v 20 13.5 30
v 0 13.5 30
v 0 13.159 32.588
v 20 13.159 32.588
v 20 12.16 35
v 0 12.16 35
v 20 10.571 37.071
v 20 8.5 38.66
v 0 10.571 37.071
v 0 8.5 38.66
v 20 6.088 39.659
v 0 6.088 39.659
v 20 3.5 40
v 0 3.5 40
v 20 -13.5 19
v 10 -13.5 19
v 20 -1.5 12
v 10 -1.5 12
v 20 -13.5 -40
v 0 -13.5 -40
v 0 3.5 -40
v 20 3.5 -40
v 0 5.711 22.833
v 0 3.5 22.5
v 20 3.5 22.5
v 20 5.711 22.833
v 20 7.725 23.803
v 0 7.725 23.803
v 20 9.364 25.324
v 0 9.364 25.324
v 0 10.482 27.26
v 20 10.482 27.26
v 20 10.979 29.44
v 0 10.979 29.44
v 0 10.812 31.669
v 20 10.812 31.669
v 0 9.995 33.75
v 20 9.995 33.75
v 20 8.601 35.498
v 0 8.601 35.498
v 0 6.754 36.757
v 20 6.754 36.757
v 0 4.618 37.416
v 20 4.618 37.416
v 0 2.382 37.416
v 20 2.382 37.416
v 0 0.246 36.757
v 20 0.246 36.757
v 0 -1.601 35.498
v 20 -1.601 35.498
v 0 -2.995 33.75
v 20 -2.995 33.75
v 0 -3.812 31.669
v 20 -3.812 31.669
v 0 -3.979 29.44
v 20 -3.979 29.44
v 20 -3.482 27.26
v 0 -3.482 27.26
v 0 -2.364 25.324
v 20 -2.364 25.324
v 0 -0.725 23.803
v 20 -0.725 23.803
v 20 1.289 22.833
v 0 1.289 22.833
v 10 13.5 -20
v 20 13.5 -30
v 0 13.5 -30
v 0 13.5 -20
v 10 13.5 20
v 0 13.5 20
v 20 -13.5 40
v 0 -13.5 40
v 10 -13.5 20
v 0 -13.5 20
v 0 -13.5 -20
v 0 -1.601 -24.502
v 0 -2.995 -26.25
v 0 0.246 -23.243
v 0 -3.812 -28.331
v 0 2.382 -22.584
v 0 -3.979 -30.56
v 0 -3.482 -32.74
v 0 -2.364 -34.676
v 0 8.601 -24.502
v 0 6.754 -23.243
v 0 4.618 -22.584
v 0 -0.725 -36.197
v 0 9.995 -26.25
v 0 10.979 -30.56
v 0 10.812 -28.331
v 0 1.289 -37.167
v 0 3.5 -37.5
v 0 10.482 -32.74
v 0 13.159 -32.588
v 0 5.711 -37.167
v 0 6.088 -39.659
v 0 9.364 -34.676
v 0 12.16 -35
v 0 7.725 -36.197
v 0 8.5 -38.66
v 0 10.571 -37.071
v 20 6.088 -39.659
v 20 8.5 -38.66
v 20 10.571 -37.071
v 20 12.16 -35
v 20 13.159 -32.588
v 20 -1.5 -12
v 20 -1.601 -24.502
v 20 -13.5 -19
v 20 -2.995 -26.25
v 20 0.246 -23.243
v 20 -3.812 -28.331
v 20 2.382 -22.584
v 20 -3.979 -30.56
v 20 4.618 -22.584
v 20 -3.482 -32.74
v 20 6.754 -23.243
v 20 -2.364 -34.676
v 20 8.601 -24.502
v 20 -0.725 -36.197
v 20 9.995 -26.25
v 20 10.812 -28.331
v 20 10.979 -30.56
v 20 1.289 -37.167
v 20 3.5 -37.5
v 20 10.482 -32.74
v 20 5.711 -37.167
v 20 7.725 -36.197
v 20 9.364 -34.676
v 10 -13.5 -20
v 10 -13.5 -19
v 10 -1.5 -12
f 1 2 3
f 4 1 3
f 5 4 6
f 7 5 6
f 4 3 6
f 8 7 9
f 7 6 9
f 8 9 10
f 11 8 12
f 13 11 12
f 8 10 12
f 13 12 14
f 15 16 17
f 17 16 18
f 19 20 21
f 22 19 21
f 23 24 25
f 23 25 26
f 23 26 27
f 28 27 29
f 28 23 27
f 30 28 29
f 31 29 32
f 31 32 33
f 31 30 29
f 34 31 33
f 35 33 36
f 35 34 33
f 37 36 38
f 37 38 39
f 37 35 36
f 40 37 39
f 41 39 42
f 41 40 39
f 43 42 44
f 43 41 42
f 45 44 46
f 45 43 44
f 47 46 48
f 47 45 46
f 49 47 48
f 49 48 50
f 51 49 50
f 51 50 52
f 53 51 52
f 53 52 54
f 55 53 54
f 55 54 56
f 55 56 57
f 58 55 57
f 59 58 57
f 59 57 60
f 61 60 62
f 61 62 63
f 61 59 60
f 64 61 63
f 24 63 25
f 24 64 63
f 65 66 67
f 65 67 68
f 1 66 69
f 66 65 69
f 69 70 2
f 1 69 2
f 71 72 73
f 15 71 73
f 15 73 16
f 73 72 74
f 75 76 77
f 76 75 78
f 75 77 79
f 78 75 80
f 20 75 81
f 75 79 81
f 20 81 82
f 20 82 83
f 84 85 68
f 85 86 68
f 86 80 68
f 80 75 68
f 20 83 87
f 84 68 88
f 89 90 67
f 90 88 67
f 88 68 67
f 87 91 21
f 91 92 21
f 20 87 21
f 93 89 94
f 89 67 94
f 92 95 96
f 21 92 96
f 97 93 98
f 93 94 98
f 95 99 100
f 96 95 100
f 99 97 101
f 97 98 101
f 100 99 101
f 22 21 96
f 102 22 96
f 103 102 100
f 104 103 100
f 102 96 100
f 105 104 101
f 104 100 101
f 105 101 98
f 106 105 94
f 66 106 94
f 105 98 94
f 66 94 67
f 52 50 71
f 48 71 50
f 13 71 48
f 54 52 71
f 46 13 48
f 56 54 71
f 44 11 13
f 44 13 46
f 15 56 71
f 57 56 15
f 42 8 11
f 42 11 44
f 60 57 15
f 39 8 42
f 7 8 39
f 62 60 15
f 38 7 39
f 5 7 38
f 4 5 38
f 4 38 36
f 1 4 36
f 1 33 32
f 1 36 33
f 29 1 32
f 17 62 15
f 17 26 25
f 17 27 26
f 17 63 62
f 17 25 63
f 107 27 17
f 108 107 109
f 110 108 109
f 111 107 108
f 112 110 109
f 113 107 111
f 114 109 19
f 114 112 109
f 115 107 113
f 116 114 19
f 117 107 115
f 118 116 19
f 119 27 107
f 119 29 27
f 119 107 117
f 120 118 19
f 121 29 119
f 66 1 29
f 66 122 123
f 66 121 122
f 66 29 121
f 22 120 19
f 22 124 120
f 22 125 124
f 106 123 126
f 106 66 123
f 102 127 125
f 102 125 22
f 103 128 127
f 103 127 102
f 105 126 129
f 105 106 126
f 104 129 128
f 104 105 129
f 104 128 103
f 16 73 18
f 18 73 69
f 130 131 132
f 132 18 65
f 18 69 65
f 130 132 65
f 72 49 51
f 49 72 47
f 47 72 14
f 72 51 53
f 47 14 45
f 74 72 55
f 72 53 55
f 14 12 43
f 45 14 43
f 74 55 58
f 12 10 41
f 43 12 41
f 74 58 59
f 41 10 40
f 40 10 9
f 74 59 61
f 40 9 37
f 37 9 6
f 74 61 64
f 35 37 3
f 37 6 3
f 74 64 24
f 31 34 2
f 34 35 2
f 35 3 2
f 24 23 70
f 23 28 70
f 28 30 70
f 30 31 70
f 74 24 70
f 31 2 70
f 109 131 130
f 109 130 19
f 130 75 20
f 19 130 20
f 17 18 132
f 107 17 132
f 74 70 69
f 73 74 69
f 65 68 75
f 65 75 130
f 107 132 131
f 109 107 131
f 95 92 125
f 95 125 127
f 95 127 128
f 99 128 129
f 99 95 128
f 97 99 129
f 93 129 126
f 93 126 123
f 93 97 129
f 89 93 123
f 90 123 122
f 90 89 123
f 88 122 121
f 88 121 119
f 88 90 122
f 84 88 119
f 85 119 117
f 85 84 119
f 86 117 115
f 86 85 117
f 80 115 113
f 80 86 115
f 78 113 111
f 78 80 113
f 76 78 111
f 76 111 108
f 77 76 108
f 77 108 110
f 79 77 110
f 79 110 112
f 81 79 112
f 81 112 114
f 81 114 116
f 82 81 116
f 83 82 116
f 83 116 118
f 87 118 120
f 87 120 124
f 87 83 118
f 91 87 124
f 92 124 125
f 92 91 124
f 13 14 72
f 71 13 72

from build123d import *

# Parameters (mm, degrees)
SKETCH1_R           = 7.5
BOSS_EXTRUDE1_DEPTH = 20
SKETCH2_W           = 10
SKETCH2_H           = 40
CUT_EXTRUDE1_DEPTH  = 53.239831546


with BuildPart() as part:
    # Sketch1 → Boss-Extrude1 (new body)
    with BuildSketch(Plane(origin=(0, 0, 0), x_dir=(0, 0, -1), z_dir=(1, 0, 0))):
        with BuildLine():
            Line((-19, -13.5), (-12, -1.5))
            Line((-12, -1.5), (12, -1.5))
            Line((12, -1.5), (19, -13.5))
            Line((19, -13.5), (40, -13.5))
            Line((40, -13.5), (40, 3.5))
            ThreePointArc((40, 3.5), (37.071067812, 10.571067812), (30, 13.5))
            Line((30, 13.5), (-30, 13.5))
            ThreePointArc((-30, 13.5), (-37.071067812, 10.571067812), (-40, 3.5))
            Line((-40, 3.5), (-40, -13.5))
            Line((-40, -13.5), (-19, -13.5))
        make_face()
        with Locations((-30, 3.5)):
            Circle(SKETCH1_R, mode=Mode.SUBTRACT)
        with Locations((30, 3.5)):
            Circle(SKETCH1_R, mode=Mode.SUBTRACT)
    extrude(amount=BOSS_EXTRUDE1_DEPTH)

    # Sketch2 → Cut-Extrude1 (cut, through all)
    with BuildSketch(Plane(origin=(0, 13.5, 0), x_dir=(1, 0, 0), z_dir=(0, 1, 0))):
        with Locations((5, 0)):
            Rectangle(SKETCH2_W, SKETCH2_H)
    extrude(amount=-CUT_EXTRUDE1_DEPTH, mode=Mode.SUBTRACT)


solid = part.part
